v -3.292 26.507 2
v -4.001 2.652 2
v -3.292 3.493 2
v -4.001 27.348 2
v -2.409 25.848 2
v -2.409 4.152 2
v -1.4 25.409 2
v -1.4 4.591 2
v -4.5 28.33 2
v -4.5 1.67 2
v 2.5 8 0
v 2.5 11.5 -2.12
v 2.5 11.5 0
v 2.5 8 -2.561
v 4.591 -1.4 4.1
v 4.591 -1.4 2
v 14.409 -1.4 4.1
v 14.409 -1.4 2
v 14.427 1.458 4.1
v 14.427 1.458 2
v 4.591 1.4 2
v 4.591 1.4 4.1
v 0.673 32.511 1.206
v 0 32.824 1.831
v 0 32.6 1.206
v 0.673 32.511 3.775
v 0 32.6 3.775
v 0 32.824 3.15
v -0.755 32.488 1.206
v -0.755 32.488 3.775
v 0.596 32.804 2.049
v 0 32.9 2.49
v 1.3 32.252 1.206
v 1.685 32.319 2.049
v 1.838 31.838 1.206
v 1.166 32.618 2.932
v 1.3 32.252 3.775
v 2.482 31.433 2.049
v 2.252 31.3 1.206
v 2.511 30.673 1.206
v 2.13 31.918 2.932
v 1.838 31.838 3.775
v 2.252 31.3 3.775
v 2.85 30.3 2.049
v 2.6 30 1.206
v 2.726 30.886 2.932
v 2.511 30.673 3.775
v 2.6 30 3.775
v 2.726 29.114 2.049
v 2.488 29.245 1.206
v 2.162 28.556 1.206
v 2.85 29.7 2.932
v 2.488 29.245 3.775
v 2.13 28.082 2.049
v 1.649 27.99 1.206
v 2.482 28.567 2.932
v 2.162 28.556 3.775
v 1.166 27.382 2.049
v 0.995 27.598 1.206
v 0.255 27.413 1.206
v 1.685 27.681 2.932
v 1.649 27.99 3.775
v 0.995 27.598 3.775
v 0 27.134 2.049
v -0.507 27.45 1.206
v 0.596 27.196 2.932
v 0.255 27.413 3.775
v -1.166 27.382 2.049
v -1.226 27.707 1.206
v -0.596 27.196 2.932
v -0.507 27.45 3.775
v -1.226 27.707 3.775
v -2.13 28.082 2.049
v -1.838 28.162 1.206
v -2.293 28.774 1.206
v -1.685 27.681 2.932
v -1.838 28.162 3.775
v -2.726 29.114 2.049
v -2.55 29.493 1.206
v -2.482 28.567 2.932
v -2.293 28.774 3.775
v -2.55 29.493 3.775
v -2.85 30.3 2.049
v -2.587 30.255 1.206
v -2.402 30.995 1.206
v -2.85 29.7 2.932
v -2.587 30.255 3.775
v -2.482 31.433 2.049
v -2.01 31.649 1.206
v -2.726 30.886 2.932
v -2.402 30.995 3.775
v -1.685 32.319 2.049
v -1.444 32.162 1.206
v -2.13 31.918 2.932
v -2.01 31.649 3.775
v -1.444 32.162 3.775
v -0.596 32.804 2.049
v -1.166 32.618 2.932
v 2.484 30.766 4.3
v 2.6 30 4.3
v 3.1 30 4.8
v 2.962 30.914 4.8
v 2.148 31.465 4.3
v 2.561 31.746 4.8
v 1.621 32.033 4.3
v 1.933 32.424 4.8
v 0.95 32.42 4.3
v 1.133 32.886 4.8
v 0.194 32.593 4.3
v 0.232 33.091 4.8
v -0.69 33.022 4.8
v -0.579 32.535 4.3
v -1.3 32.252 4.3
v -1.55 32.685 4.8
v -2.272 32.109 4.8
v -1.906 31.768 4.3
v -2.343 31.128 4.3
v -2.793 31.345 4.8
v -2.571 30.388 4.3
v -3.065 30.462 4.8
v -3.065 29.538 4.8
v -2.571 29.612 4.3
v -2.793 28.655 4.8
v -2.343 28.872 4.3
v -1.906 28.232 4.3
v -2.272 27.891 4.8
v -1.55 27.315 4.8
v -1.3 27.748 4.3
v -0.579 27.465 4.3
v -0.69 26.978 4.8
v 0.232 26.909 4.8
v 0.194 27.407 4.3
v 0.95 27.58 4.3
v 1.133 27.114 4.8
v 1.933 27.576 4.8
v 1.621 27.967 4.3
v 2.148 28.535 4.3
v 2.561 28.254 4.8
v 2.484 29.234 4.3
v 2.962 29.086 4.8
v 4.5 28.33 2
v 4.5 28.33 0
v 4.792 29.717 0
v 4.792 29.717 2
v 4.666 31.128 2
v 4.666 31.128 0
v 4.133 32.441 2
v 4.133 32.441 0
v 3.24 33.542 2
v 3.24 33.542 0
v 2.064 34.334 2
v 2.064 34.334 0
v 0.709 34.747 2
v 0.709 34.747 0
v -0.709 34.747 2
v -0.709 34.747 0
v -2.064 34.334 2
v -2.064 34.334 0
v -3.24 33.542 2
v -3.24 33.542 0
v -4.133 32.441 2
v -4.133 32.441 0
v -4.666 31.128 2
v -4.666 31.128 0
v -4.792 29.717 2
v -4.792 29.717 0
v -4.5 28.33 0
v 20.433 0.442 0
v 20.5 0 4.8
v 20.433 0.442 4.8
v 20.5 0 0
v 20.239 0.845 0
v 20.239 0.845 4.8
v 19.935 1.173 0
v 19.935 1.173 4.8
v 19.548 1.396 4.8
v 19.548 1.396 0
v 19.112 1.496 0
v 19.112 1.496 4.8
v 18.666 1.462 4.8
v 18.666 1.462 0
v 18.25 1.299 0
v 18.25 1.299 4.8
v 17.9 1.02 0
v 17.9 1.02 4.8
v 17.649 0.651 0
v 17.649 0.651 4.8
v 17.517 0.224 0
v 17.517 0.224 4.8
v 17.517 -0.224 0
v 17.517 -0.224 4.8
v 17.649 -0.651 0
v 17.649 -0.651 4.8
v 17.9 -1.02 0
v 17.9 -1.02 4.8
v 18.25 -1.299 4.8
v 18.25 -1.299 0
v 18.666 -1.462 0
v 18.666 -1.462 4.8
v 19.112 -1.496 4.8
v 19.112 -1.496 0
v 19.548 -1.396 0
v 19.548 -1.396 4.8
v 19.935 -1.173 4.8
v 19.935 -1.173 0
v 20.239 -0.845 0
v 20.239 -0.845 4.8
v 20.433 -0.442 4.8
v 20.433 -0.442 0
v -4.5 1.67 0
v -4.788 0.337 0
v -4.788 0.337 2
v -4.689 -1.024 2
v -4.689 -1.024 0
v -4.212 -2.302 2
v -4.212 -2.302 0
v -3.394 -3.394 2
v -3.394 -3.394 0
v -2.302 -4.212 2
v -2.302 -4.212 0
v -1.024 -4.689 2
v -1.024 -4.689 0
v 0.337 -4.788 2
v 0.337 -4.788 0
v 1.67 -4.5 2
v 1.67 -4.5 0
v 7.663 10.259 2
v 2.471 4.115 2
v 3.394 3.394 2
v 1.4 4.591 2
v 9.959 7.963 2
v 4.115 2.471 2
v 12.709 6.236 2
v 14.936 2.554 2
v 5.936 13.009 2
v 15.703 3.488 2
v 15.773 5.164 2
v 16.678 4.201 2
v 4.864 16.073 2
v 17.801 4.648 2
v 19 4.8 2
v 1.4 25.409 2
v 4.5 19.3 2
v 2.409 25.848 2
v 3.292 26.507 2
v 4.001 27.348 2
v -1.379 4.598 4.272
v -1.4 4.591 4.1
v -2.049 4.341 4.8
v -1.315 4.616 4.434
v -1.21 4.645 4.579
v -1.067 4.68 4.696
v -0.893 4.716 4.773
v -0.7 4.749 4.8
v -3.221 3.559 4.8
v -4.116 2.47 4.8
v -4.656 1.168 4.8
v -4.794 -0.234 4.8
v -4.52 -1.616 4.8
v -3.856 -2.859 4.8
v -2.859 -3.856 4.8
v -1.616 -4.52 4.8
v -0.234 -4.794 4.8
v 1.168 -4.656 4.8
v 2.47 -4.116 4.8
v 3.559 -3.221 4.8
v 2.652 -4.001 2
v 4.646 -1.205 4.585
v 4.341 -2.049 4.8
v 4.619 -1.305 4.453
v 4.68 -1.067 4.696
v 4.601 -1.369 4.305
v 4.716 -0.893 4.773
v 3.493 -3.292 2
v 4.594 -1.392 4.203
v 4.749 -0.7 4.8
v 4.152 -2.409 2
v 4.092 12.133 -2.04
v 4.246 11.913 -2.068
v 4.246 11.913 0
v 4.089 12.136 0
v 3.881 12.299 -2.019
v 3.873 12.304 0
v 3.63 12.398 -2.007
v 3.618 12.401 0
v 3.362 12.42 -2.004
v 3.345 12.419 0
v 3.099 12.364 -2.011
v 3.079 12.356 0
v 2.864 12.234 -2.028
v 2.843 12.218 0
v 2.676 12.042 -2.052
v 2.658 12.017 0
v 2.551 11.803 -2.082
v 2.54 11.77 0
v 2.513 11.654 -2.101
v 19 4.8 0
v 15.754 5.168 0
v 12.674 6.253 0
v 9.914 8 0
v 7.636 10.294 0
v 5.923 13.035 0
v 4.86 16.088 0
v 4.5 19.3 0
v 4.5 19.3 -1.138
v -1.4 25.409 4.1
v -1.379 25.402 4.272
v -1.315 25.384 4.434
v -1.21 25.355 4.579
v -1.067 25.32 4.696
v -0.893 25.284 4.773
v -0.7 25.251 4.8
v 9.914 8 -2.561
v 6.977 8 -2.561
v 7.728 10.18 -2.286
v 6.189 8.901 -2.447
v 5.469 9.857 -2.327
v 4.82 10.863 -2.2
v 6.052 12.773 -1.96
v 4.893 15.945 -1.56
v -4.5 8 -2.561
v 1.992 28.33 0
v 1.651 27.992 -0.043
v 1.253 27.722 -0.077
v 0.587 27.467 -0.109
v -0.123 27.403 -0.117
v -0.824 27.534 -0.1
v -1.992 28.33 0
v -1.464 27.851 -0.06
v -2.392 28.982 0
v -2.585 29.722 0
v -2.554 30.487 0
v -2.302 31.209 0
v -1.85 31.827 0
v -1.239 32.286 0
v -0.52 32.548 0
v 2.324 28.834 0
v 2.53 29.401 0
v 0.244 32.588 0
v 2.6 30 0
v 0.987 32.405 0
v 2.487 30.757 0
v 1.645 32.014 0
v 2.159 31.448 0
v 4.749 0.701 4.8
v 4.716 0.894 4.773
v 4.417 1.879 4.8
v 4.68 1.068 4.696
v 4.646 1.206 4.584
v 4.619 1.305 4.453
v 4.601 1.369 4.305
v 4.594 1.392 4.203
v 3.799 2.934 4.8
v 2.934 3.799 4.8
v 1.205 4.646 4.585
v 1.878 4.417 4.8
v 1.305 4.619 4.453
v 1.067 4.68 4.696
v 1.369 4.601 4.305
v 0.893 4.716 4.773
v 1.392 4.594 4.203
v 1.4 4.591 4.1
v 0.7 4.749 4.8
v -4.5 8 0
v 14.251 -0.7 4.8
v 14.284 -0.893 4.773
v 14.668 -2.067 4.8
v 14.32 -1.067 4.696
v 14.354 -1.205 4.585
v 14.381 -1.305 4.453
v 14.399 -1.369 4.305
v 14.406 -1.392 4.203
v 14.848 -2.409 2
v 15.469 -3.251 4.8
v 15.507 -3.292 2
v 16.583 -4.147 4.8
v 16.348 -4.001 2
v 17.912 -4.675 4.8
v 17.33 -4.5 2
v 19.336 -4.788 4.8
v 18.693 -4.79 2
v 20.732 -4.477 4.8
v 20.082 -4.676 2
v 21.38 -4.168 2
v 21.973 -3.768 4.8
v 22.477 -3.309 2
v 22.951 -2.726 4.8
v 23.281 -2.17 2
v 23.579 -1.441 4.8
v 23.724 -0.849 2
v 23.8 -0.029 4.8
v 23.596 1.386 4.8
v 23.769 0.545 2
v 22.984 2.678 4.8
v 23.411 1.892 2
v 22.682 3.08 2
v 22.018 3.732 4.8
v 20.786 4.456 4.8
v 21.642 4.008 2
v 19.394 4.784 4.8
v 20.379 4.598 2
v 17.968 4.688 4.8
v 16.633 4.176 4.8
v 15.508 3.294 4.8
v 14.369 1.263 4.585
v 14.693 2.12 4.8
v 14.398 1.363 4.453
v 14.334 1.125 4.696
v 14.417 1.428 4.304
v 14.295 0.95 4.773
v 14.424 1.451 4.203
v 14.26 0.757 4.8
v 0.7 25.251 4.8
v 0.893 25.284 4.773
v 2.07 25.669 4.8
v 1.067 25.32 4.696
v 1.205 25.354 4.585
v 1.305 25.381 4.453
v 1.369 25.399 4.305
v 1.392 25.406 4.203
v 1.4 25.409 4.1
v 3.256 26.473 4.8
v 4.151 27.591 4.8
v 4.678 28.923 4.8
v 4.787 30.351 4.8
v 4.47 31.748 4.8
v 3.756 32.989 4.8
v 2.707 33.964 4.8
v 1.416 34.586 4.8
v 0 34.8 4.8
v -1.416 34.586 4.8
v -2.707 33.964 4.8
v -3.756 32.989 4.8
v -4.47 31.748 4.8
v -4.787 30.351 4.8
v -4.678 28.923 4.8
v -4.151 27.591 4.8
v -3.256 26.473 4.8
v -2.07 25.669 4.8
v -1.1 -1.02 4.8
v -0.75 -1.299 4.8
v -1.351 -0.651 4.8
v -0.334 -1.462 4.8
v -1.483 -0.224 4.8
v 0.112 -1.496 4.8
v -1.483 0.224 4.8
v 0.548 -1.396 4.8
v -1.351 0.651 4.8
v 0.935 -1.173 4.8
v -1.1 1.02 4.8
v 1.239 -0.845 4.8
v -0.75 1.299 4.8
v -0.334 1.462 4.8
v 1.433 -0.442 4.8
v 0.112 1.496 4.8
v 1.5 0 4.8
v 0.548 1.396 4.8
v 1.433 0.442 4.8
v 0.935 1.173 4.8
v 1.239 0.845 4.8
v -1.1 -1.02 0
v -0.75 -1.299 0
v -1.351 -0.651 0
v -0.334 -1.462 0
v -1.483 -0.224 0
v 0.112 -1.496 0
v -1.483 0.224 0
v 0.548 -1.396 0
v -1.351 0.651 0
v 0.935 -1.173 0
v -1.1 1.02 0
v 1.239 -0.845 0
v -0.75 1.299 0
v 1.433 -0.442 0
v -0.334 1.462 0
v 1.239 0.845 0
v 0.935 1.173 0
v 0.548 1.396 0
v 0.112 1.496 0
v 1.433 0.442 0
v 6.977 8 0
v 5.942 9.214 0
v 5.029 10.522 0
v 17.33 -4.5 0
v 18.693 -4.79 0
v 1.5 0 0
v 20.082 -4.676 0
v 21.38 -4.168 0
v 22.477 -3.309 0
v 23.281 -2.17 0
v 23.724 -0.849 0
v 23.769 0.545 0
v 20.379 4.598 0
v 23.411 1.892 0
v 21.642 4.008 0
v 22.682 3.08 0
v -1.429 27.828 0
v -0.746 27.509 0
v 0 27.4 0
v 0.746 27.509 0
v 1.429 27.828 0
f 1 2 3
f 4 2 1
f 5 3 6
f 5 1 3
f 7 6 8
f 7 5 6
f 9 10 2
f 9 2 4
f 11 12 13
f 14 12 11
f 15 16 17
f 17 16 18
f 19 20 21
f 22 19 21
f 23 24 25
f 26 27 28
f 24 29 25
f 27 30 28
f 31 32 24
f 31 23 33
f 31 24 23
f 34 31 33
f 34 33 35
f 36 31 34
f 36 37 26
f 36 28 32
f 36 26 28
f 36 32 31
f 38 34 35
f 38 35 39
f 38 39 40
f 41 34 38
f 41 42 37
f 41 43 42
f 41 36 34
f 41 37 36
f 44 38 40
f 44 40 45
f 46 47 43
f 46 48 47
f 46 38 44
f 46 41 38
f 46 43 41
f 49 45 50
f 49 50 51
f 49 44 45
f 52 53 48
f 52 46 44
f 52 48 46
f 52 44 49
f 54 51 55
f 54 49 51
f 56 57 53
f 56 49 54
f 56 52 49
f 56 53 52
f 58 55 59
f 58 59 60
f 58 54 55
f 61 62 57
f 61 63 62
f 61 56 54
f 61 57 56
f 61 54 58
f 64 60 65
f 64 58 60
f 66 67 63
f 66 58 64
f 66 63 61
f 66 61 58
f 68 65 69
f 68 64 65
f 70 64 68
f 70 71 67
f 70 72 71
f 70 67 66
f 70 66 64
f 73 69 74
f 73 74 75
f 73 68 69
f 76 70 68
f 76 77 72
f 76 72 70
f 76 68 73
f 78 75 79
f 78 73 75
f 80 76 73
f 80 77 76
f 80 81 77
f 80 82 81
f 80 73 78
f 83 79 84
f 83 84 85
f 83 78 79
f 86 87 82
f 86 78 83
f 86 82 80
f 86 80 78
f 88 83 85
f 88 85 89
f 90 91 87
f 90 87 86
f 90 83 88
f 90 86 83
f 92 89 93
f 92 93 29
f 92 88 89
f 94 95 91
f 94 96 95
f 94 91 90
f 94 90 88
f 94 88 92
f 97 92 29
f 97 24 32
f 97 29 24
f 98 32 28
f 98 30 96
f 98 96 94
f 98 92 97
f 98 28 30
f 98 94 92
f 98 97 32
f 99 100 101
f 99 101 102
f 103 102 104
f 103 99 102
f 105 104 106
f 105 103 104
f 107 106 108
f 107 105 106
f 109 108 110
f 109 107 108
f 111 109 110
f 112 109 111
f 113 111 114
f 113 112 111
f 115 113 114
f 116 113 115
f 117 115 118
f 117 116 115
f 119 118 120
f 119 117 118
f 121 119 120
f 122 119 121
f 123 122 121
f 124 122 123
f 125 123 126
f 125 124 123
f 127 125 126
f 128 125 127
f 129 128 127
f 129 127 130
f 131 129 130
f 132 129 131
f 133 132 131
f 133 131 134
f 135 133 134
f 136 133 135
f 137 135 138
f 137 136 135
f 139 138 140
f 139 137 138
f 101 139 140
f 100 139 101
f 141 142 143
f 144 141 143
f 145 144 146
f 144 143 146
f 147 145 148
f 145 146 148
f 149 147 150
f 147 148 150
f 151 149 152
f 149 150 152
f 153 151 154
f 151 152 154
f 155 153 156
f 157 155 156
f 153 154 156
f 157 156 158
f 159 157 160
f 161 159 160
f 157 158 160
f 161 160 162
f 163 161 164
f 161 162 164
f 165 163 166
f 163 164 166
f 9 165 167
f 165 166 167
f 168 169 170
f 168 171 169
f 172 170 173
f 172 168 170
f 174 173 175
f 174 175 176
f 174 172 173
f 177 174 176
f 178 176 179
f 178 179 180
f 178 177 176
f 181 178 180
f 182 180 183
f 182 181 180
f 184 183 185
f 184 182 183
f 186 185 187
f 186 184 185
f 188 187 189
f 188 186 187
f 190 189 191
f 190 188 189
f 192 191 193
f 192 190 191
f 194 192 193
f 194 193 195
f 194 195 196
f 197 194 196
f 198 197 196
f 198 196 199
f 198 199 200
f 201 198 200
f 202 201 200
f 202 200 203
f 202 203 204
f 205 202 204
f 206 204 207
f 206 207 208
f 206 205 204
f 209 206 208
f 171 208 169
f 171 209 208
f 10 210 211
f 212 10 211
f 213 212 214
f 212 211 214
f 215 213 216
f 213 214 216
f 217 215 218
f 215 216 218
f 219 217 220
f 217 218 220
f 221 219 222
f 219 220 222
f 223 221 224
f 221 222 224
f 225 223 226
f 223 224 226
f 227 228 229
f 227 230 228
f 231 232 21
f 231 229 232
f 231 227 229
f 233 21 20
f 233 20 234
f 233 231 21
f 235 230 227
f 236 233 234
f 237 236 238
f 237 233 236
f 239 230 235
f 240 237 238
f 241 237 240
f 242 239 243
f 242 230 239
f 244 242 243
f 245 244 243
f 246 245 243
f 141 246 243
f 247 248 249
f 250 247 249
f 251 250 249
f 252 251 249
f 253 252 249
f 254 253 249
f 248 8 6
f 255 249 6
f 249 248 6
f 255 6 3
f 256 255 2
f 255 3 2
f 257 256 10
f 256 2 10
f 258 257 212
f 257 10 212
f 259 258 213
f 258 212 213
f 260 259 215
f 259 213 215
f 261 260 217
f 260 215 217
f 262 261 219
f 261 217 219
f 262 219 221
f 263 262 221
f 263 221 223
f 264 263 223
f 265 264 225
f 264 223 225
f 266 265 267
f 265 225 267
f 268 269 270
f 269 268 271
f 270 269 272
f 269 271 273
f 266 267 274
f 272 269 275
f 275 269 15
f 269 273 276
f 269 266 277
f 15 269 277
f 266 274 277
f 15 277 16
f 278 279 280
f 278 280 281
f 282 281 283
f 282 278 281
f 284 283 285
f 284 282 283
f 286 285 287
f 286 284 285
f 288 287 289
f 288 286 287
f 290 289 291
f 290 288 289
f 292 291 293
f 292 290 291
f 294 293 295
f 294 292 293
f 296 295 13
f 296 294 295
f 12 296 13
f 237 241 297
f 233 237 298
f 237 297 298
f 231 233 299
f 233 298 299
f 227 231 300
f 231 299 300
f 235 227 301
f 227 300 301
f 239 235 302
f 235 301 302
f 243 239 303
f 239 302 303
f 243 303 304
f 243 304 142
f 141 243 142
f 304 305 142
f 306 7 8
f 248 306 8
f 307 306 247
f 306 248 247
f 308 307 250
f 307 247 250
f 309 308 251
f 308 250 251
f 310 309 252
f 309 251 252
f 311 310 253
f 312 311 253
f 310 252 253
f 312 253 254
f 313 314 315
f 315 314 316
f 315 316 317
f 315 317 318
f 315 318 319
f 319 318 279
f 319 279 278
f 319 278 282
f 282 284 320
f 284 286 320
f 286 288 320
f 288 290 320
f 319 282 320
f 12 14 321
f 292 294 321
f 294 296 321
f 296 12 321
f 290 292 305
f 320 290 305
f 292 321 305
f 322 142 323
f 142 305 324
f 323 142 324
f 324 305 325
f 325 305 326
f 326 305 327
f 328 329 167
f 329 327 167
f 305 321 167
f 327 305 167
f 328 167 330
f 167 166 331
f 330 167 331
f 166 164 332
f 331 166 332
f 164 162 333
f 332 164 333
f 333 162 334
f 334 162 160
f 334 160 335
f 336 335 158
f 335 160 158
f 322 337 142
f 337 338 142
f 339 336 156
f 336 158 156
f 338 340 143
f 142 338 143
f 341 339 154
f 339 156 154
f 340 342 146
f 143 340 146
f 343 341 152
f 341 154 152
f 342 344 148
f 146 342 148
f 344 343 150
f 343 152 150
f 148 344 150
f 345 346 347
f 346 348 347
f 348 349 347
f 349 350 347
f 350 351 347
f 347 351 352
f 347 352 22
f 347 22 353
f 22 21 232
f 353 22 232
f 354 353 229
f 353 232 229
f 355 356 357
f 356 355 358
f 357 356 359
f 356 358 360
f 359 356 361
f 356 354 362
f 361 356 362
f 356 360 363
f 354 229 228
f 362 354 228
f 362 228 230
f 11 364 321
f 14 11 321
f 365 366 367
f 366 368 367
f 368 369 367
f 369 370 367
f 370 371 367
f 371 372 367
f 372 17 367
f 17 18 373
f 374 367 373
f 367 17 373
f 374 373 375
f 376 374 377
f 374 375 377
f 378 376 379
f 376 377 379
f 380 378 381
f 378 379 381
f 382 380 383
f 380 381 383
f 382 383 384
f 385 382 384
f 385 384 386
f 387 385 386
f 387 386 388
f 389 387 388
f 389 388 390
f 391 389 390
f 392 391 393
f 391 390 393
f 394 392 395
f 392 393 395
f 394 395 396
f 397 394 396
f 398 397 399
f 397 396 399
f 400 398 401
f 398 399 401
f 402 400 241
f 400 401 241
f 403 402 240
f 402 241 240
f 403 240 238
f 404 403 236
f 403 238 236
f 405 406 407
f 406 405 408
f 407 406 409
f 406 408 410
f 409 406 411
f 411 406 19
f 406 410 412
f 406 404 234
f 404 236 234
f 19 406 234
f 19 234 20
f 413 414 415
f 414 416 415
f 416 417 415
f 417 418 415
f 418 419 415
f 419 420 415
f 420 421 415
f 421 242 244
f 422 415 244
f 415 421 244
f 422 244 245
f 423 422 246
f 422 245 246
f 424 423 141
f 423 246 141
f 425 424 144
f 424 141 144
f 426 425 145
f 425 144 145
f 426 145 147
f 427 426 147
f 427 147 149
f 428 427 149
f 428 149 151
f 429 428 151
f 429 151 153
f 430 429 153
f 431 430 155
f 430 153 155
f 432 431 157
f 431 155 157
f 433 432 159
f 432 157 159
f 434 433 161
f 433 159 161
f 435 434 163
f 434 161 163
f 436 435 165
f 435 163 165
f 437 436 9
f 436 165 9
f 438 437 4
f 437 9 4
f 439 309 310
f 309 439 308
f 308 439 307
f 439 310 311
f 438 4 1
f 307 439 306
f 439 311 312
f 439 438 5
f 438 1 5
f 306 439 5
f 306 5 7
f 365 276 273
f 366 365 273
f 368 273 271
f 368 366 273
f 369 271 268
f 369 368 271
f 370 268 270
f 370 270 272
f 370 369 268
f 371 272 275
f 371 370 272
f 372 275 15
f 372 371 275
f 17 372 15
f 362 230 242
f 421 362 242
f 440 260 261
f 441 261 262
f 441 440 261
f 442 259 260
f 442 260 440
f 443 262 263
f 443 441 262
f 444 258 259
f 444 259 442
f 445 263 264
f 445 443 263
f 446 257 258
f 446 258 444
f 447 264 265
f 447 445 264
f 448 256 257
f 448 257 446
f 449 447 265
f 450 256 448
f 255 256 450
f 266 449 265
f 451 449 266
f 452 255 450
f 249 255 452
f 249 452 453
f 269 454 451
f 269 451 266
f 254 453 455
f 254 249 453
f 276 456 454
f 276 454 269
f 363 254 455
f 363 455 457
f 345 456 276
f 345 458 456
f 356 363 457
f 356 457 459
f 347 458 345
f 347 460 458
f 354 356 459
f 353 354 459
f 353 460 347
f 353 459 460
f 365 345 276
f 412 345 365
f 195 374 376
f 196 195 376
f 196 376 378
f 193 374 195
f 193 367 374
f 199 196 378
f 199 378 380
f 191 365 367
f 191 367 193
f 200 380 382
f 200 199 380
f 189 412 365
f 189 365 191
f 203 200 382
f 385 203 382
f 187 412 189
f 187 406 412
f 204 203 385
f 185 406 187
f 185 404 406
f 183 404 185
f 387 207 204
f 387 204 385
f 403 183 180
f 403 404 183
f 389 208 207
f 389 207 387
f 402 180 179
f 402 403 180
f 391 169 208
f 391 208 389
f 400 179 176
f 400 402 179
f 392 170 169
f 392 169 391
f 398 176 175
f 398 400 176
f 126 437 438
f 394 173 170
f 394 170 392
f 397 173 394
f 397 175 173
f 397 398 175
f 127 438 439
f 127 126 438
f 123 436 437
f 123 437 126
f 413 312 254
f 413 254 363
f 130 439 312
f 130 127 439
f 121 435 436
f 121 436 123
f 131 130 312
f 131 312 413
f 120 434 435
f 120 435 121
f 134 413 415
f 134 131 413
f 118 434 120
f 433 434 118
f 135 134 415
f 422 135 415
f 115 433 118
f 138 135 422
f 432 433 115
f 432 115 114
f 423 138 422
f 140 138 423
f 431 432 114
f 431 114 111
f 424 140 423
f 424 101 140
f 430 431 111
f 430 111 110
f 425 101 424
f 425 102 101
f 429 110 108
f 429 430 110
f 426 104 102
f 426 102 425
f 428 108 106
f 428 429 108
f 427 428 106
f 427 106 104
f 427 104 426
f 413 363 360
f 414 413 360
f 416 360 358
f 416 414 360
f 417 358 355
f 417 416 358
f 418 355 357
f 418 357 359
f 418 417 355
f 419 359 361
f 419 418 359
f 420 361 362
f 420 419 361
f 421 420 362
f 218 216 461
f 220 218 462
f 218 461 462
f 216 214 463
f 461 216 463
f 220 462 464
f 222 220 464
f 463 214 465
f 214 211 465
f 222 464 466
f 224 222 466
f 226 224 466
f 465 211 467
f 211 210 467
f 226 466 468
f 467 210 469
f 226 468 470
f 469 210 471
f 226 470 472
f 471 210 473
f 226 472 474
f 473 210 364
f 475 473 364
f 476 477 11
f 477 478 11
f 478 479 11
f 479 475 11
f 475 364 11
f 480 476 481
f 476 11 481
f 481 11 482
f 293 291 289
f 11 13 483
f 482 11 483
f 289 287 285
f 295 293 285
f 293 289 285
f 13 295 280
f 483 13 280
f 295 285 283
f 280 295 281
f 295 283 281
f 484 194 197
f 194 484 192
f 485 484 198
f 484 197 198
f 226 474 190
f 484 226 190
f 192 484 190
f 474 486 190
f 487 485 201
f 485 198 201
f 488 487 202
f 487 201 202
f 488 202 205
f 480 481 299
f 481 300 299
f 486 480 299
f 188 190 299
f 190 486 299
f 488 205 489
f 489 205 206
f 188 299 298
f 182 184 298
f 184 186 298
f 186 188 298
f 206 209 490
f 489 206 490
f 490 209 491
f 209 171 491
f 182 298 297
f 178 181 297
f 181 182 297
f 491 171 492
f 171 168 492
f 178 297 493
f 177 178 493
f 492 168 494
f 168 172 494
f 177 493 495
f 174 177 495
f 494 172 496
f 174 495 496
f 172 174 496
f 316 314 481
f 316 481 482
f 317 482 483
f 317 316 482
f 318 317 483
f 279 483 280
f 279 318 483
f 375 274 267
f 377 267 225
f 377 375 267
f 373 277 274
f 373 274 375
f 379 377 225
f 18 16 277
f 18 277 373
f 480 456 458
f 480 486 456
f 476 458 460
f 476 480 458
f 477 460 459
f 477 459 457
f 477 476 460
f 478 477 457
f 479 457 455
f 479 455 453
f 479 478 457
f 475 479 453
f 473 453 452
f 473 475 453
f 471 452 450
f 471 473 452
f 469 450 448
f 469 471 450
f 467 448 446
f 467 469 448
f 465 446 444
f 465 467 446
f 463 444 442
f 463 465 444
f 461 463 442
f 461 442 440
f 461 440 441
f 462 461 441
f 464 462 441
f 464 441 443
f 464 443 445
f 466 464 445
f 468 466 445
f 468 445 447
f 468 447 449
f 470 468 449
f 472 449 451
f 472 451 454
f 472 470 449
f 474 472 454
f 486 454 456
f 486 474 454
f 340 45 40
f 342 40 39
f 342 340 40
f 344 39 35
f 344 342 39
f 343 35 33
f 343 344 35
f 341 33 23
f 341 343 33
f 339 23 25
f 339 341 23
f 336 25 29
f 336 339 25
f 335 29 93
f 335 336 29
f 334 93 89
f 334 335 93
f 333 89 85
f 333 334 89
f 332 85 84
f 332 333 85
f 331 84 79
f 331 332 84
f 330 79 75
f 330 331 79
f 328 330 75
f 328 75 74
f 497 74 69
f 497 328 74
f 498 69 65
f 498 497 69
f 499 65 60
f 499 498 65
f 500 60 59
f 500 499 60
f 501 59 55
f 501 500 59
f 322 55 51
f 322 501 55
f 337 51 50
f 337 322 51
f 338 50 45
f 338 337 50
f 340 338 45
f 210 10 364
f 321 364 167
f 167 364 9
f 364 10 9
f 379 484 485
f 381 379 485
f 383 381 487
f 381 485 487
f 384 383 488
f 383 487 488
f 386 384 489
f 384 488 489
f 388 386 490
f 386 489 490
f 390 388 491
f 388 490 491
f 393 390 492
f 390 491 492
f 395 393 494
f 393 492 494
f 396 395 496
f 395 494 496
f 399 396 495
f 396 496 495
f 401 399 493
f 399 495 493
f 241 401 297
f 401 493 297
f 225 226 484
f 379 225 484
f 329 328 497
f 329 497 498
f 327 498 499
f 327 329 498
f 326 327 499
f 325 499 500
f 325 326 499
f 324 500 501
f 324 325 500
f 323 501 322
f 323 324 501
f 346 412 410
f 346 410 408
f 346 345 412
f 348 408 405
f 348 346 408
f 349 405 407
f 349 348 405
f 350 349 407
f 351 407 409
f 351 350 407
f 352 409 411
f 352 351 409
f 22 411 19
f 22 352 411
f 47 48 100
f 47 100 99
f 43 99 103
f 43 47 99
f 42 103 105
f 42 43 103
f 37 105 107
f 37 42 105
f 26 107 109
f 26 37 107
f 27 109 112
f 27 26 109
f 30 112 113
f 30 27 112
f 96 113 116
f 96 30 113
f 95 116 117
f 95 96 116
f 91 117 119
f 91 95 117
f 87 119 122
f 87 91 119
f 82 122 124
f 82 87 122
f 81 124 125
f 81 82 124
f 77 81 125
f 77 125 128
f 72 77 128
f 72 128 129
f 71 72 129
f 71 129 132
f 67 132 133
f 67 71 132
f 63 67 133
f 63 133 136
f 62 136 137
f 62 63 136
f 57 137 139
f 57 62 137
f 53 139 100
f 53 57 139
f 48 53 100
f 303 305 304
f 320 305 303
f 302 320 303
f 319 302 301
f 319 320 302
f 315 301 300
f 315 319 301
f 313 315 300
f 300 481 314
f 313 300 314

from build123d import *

# Parameters (mm, degrees)
SKETCH_1_R            = 1.5
SKETCH_1_R_2          = 2.6
EXTRUDE_1_DEPTH       = 2
SKETCH_2_R            = 1.5
SKETCH_2_R_2          = 2.6
EXTRUDE_2_DEPTH       = 2.8
FILLET_1_R            = 0.7
EXTRUDE_START         = -4.5
EXTRUDE_3_DEPTH       = 7
EXTRUDE_START_2       = 2.5
EXTRUDE_3_2_DEPTH     = 7.413746647
EXTRUDE_START_3       = -4
EXTRUDE_3_3_OUTLINE_R = 1.5
EXTRUDE_3_3_DEPTH     = 4
CHAMFER_1_SIZE        = 0.5


with BuildPart() as part:
    # 草图1 → 凸台-拉伸1 (new body)
    with BuildSketch(Plane.XY):
        with BuildLine():
            Line((4.5, 19.3), (4.5, 28.329670691))
            ThreePointArc((4.5, 28.329670691), (0, 34.8), (-4.5, 28.329670691))
            Line((-4.5, 28.329670691), (-4.5, 1.670329309))
            ThreePointArc((-4.5, 1.670329309), (-3.39411255, -3.39411255), (1.670329309, -4.5))
            Line((1.670329309, -4.5), (17.329670691, -4.5))
            ThreePointArc((17.329670691, -4.5), (23.724404724, -0.848528137), (19, 4.8))
            ThreePointArc((19, 4.8), (8.746951673, 9.046951673), (4.5, 19.3))
        make_face()
        Circle(SKETCH_1_R, mode=Mode.SUBTRACT)
        with Locations((19, 0)):
            Circle(SKETCH_1_R, mode=Mode.SUBTRACT)
        with Locations((0, 30)):
            Circle(SKETCH_1_R_2, mode=Mode.SUBTRACT)
    extrude(amount=EXTRUDE_1_DEPTH)

    # 草图2 → 凸台-拉伸2 (add)
    with BuildSketch(Plane.XY.offset(2)):
        with BuildLine():
            Line((-1.4, 25.408703887), (-1.4, 4.591296113))
            ThreePointArc((-1.4, 4.591296113), (-3.39411255, -3.39411255), (4.591296113, -1.4))
            Line((4.591296113, -1.4), (14.408703887, -1.4))
            ThreePointArc((14.408703887, -1.4), (23.799903071, -0.030504201), (14.426868498, 1.458241497))
            Line((14.426868498, 1.458241497), (4.591296113, 1.4))
            ThreePointArc((4.591296113, 1.4), (3.39411255, 3.39411255), (1.4, 4.591296113))
            Line((1.4, 4.591296113), (1.4, 25.408703887))
            ThreePointArc((1.4, 25.408703887), (0, 34.8), (-1.4, 25.408703887))
        make_face()
        Circle(SKETCH_2_R, mode=Mode.SUBTRACT)
        with Locations((0, 30)):
            Circle(SKETCH_2_R_2, mode=Mode.SUBTRACT)
        with Locations((19, 0)):
            Circle(SKETCH_2_R, mode=Mode.SUBTRACT)
    extrude(amount=EXTRUDE_2_DEPTH)

    # 圆角1
    fillet_1_edges = [part.edges().sort_by_distance(p)[0] for p in [
        (-1.4, 15, 4.8),
        (9.5, -1.4, 4.8),
        (9.509082305, 1.429120748, 4.8),
        (1.4, 15, 4.8),
    ]]
    fillet(fillet_1_edges, radius=FILLET_1_R)

    # 凸台-拉伸3: read off the stored shape, not the designer's step
    # 凸台-拉伸3 outline → 凸台-拉伸3 (add)
    with BuildSketch(Plane.YZ.offset(EXTRUDE_START)):
        Polygon((28.329670691, 0), (8, 0), (8, -2.561025334), align=None)
    extrude(amount=EXTRUDE_3_DEPTH)

    # Extrude 3 2 outline → Extrude 3 2 (add)
    with BuildSketch(Plane.YZ.offset(EXTRUDE_START_2)):
        Polygon((28.329670691, 0), (8, 0), (8, -2.561025334), align=None)
    extrude(amount=EXTRUDE_3_2_DEPTH)

    # Extrude 3 3 outline → Extrude 3 3 (cut)
    # profile 1 of 3: a face of its own
    with BuildSketch(Plane.XY.offset(EXTRUDE_START_3)):
        with BuildLine():
            ThreePointArc((4.5, 19.3), (5.923290291, 13.035044837), (9.913746647, 8))
            Line((9.913746647, 8), (9.913746647, 28.329670691))
            Line((9.913746647, 28.329670691), (4.5, 28.329670691))
            Line((4.5, 28.329670691), (4.5, 19.3))
        make_face()
    # profile 2 of 3: a face of its own
    with BuildSketch(Plane.XY.offset(EXTRUDE_START_3)):
        with BuildLine():
            ThreePointArc((6.976689308, 8), (5.469210572, 9.857132985), (4.246086412, 11.912711334))
            ThreePointArc((4.246086412, 11.912711334), (3.209776536, 12.39709927), (2.5, 11.5))
            Line((2.5, 11.5), (2.5, 8))
            Line((2.5, 8), (-4.5, 8))
            Line((-4.5, 8), (-4.5, 1.670329309))
            ThreePointArc((-4.5, 1.670329309), (-3.39411255, -3.39411255), (1.670329309, -4.5))
            Line((1.670329309, -4.5), (17.329670691, -4.5))
            ThreePointArc((17.329670691, -4.5), (23.724404724, -0.848528137), (19, 4.8))
            ThreePointArc((19, 4.8), (14.183362168, 5.62337761), (9.913746647, 8))
            Line((9.913746647, 8), (6.976689308, 8))
        make_face()
        Circle(EXTRUDE_3_3_OUTLINE_R, mode=Mode.SUBTRACT)
        with Locations((19, 0)):
            Circle(EXTRUDE_3_3_OUTLINE_R, mode=Mode.SUBTRACT)
    # profile 3 of 3: a face of its own
    with BuildSketch(Plane.XY.offset(EXTRUDE_START_3)):
        with BuildLine():
            Line((1.992485884, 28.329670691), (-1.992485884, 28.329670691))
            ThreePointArc((-1.992485884, 28.329670691), (0, 27.4), (1.992485884, 28.329670691))
        make_face()
    extrude(amount=EXTRUDE_3_3_DEPTH, mode=Mode.SUBTRACT)

    # 草图6 → 切除-旋转1 (revolve, cut)
    with BuildSketch(Plane(origin=(0, 0, 0), x_dir=(0, 0, -1), z_dir=(1, 0, 0))):
        with BuildLine():
            Line((-5.3904059, 30), (0.4095941, 30))
            ThreePointArc((0.4095941, 30), (-2.4904059, 32.9), (-5.3904059, 30))
        make_face()
    revolve(axis=Axis((0, 30, 4.8), (0, 0, -1)), mode=Mode.SUBTRACT)

    # 倒角1
    chamfer_1_edges = [part.edges().sort_by_distance(p)[0] for p in [
        (-2.6, 30, 4.8),
    ]]
    chamfer(chamfer_1_edges, length=CHAMFER_1_SIZE)


solid = part.part
